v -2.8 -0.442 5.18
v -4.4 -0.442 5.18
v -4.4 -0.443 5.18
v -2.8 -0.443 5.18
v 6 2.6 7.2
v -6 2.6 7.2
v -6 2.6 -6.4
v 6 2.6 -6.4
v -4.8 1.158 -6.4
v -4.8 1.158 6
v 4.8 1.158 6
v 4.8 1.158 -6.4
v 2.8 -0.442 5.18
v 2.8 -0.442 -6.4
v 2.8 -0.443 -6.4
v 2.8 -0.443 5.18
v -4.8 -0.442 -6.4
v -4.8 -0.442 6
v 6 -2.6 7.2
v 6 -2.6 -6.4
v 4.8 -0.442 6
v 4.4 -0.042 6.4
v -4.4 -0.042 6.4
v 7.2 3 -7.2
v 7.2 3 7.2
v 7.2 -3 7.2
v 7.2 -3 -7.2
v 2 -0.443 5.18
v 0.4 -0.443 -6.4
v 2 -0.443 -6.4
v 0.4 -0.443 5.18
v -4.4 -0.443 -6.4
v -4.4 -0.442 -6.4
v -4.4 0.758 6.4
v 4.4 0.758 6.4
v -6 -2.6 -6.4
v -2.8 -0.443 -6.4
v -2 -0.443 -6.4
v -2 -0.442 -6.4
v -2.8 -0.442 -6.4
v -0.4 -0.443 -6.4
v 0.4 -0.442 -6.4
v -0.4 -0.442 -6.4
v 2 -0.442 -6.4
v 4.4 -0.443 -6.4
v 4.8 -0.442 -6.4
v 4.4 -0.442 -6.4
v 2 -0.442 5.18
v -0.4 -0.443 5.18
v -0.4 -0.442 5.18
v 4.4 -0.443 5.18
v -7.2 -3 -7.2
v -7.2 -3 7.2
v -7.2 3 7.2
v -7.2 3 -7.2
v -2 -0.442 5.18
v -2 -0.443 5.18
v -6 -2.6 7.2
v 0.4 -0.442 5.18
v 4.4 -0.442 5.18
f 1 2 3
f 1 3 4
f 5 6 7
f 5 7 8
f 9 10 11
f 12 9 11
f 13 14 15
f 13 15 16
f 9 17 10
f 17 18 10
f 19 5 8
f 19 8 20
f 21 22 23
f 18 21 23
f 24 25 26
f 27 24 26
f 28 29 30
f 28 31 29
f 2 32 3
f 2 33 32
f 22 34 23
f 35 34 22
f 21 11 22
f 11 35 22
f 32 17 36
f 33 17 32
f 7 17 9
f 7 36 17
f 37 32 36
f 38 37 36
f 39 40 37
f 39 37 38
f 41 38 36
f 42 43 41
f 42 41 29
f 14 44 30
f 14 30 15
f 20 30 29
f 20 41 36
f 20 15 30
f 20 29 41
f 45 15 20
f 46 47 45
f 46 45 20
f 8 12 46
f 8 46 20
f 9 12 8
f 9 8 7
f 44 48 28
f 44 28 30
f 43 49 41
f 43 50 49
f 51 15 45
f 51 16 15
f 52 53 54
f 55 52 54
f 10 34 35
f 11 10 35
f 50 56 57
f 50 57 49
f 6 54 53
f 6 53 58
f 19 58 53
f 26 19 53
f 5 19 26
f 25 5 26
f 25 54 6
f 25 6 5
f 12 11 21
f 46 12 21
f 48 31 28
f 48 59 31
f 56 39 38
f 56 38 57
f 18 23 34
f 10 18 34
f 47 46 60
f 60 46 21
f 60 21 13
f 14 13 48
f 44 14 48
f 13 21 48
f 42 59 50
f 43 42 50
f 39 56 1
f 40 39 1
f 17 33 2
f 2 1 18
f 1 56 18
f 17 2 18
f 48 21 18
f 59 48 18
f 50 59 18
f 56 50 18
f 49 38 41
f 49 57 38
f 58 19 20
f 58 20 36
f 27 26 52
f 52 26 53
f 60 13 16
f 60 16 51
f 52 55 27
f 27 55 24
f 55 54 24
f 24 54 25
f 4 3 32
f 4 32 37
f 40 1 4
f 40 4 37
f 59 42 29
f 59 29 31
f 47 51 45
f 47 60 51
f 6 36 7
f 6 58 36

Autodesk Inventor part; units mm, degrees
ref_plane "YZ Plane" through (0, 0, 0) normal (1, 0, 0) x (0, 1, 0)
ref_plane "XZ Plane" through (0, 0, 0) normal (0, 1, 0) x (-1, 0, 0)
ref_plane "XY Plane" through (0, 0, 0) normal (0, 0, 1) x (1, 0, 0)
sketch "Sketch2" plane through (0, 0, 0) normal (0, 0, 1) x (1, 0, 0)
  line L0 (-6, 2.6) -> (6, 2.6)
  line L1 (6, 2.6) -> (6, -2.6)
  line L2 (6, -2.6) -> (-6, -2.6)
  line L3 (-6, -2.6) -> (-6, 2.6)
  line L4 (-7.2, 3) -> (7.2, 3)
  line L5 (7.2, 3) -> (7.2, -3)
  line L6 (7.2, -3) -> (-7.2, -3)
  line L7 (-7.2, -3) -> (-7.2, 3)
  point P0 (0, 0)
  point P1 (0, 2.6)
  point P2 (-6, 0)
  point P3 (-7.2, 0)
  point P4 (0, 3)
  dimension "d0" = 5.2
  dimension "d1" = 12
  dimension "d23" = 6
  dimension "d24" = 14.4
extrude "Extrusion1" add sketch "Sketch2" along normal mid plane 14.4 contours L0 L1 L2 L3 | L4 L5 L6 L7
sketch "Sketch3" plane through (0, 0, 7.2) normal (0, 0, 1) x (1, 0, 0)
  line L0 (-4.8, 1.158) -> (4.8, 1.158)
  line L1 (4.8, 1.158) -> (4.8, -0.442)
  line L2 (4.8, -0.442) -> (-4.8, -0.442)
  line L3 (-4.8, -0.442) -> (-4.8, 1.158)
  line L4 (-6, 2.6) -> (6, 2.6) projected
  line L5 (-6, -2.6) -> (-6, 2.6) projected
  line L6 (6, -2.6) -> (-6, -2.6) projected
  line L7 (6, 2.6) -> (6, -2.6) projected
  point P0 (0, 0)
  point P1 (0, -0.442)
  dimension "d4" = 1.6
  dimension "d5" = 9.6
  dimension "d25" = 0.442
extrude "Extrusion2" cut sketch "Sketch3" against normal blind 13.6
extrude "Extrusion3" cut sketch "Sketch3" against normal blind 0.8 contours L0 L1 L2 L3
chamfer "Chamfer1" distance 0.4 angle 45 4 edges at (-4.8, 0.358, 6.4) (0, 1.158, 6.4) (0, -0.442, 6.4) (4.8, 0.358, 6.4)
sketch "Sketch4" plane through (-4.8, -0.442, -6.4) normal (0, -1, 0) x (1, 0, 0)
  line L0 (0, 0) -> (9.6, 0) projected
  line L1 (0.4, 11.58) -> (2, 11.58)
  line L2 (2, 11.58) -> (2, 0)
  line L3 (2, 0) -> (0.4, 0)
  line L4 (0.4, 0) -> (0.4, 11.58)
  line L5 (2.8, 11.58) -> (4.4, 11.58)
  line L6 (4.4, 11.58) -> (4.4, 0)
  line L7 (4.4, 0) -> (2.8, 0)
  line L8 (2.8, 0) -> (2.8, 11.58)
  line L9 (5.2, 11.58) -> (6.8, 11.58)
  line L10 (6.8, 11.58) -> (6.8, 0)
  line L11 (6.8, 0) -> (5.2, 0)
  line L12 (5.2, 0) -> (5.2, 11.58)
  line L13 (7.6, 11.58) -> (9.2, 11.58)
  line L14 (9.2, 11.58) -> (9.2, 0)
  line L15 (9.2, 0) -> (7.6, 0)
  line L16 (7.6, 0) -> (7.6, 11.58)
  line L17 (2, 11.58) -> (2.8, 11.58) construction
  line L18 (4.4, 11.58) -> (5.2, 11.58) construction
  line L19 (6.8, 11.58) -> (7.6, 11.58) construction
  point P0 (4.8, 6.4)
  point P1 (4.8, 11.58)
  dimension "d18" = 11.58
  dimension "d19" = 1.6
  dimension "d20" = 0.8
extrude "Extrusion4" add sketch "Sketch4" along normal blind 0.001
equation "\"d4\" = wall"
equation "\"wall\" = 1.6"
properties part number "11032-Black" material "ABS Plastic"
